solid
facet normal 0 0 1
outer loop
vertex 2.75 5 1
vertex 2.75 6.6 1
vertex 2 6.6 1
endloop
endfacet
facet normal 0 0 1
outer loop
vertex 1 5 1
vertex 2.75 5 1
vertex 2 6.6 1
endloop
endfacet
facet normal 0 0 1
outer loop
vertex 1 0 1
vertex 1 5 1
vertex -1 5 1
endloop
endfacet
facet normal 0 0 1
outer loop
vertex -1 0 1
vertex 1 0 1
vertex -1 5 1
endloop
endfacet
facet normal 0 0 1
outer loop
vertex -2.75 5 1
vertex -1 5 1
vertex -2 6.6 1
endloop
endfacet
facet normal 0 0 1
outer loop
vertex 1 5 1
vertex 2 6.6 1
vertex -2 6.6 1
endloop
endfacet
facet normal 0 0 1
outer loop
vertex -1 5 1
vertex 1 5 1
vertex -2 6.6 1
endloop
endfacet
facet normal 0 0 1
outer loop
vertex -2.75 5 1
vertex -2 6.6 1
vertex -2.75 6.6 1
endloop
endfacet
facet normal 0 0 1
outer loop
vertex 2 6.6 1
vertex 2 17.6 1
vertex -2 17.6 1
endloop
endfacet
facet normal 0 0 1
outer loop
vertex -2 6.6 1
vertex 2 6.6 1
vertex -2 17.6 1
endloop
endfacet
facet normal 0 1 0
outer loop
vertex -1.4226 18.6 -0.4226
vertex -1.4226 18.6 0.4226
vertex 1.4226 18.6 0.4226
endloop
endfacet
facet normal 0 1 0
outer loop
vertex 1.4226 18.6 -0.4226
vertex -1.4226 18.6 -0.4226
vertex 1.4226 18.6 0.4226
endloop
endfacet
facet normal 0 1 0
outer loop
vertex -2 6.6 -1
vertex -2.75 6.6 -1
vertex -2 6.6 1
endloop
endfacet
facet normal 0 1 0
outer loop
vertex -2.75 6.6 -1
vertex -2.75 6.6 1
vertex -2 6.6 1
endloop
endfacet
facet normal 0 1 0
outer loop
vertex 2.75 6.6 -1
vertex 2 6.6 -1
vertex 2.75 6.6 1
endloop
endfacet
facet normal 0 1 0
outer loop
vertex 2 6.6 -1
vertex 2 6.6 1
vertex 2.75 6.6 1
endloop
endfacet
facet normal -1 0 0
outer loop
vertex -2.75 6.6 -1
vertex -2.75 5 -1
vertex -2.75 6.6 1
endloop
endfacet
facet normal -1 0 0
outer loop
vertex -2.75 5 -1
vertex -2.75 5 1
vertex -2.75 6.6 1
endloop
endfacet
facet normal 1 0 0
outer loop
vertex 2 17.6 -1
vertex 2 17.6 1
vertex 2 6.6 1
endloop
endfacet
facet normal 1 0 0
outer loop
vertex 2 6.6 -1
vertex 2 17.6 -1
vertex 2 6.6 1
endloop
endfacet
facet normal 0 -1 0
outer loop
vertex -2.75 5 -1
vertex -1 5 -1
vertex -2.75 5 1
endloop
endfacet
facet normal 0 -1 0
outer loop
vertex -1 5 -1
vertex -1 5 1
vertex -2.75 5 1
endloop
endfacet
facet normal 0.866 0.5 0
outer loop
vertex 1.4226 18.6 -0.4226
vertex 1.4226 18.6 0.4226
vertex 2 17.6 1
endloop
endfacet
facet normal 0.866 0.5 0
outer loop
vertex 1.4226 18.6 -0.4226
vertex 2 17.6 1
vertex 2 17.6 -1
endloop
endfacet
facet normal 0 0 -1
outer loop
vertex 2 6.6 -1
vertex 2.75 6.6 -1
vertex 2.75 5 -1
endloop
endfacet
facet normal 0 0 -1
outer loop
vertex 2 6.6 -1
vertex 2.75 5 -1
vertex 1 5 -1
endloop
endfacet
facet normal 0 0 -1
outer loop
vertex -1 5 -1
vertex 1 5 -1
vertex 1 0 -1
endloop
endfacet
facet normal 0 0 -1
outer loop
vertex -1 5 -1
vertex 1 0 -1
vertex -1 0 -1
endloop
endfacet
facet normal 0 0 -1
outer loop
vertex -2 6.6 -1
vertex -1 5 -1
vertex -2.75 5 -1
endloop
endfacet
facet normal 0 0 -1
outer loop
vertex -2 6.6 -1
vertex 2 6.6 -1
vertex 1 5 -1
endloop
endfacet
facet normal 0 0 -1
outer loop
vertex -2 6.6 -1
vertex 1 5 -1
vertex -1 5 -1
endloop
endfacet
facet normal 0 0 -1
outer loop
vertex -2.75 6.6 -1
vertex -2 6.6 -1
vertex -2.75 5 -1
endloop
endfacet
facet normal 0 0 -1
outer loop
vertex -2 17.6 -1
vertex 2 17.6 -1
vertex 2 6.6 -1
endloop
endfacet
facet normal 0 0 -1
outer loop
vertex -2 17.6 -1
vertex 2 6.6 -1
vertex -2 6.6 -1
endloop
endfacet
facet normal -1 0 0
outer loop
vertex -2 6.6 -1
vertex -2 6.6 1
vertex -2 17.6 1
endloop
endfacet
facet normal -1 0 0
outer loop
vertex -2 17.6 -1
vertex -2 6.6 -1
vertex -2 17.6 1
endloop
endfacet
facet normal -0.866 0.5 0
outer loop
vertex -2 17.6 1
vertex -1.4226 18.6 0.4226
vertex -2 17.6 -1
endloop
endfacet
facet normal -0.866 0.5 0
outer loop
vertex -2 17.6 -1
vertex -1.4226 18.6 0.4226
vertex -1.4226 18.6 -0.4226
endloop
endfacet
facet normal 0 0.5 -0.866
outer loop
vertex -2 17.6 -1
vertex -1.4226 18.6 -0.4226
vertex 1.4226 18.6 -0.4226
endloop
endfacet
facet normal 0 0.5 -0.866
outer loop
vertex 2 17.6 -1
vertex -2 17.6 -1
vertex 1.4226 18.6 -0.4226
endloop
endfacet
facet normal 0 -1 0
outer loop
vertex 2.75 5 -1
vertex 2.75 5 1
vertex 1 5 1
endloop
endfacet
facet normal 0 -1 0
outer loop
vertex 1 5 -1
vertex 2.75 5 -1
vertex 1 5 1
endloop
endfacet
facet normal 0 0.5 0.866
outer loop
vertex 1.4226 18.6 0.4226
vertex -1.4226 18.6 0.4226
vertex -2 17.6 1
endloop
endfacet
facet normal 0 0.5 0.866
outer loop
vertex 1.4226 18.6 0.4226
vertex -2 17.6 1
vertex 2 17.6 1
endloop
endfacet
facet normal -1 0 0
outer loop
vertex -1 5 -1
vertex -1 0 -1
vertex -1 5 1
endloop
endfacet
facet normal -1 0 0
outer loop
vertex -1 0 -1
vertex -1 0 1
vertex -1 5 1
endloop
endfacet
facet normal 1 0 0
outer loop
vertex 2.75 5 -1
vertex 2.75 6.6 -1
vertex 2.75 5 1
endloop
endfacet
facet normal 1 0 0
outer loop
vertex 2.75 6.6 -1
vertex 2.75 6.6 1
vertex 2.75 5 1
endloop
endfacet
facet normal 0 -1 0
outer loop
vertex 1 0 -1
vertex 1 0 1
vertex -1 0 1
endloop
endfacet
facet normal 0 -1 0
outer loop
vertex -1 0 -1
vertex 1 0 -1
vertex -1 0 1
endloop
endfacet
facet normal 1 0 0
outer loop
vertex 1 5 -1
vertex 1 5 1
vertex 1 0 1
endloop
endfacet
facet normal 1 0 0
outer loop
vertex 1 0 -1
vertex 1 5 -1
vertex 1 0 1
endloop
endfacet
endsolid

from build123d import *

# Parameters (mm, degrees)
EXTRUDE_1_DEPTH        = 1
CHAMFER_1_SIZE         = 1
CHAMFER_1_SIZE2        = 0.577350269
CHAMFER_1_PART_2_SIZE  = 1
CHAMFER_1_PART_2_SIZE2 = 0.577350269
CHAMFER_1_PART_3_SIZE  = 1
CHAMFER_1_PART_3_SIZE2 = 0.577350269
CHAMFER_1_PART_4_SIZE  = 1
CHAMFER_1_PART_4_SIZE2 = 0.577350269


with BuildPart() as part:
    # Эскиз1 → Бобышка-Вытянуть1 (new body, symmetric)
    with BuildSketch(Plane.XY):
        Polygon((1, 0), (-1, 0), (-1, 5), (-2.75, 5), (-2.75, 6.6), (-2, 6.6), (-2, 18.6), (2, 18.6), (2, 6.6), (2.75, 6.6), (2.75, 5), (1, 5), align=None)
    extrude(amount=EXTRUDE_1_DEPTH, both=True)

    # Фаска1
    chamfer_1_edges = [part.edges().sort_by_distance(p)[0] for p in [
        (0, 18.6, -1),
    ]]
    chamfer_1_side = [part.faces().sort_by_distance(p)[0] for p in [
        (0, 10.192215569, -1),
    ]]
    chamfer(chamfer_1_edges, length=CHAMFER_1_SIZE, length2=CHAMFER_1_SIZE2, reference=chamfer_1_side[0])

    # Фаска1 part 2
    chamfer_1_part_2_edges = [part.edges().sort_by_distance(p)[0] for p in [
        (-2, 18.6, 0),
    ]]
    chamfer_1_part_2_side = [part.faces().sort_by_distance(p)[0] for p in [
        (-2, 12.6, 0),
    ]]
    chamfer(chamfer_1_part_2_edges, length=CHAMFER_1_PART_2_SIZE, length2=CHAMFER_1_PART_2_SIZE2, reference=chamfer_1_part_2_side[0])

    # Фаска1 part 3
    chamfer_1_part_3_edges = [part.edges().sort_by_distance(p)[0] for p in [
        (2, 18.6, 0),
    ]]
    chamfer_1_part_3_side = [part.faces().sort_by_distance(p)[0] for p in [
        (2, 12.6, 0),
    ]]
    chamfer(chamfer_1_part_3_edges, length=CHAMFER_1_PART_3_SIZE, length2=CHAMFER_1_PART_3_SIZE2, reference=chamfer_1_part_3_side[0])

    # Фаска1 part 4
    chamfer_1_part_4_edges = [part.edges().sort_by_distance(p)[0] for p in [
        (0, 18.6, 1),
    ]]
    chamfer_1_part_4_side = [part.faces().sort_by_distance(p)[0] for p in [
        (0, 10.192215569, 1),
    ]]
    chamfer(chamfer_1_part_4_edges, length=CHAMFER_1_PART_4_SIZE, length2=CHAMFER_1_PART_4_SIZE2, reference=chamfer_1_part_4_side[0])


solid = part.part
